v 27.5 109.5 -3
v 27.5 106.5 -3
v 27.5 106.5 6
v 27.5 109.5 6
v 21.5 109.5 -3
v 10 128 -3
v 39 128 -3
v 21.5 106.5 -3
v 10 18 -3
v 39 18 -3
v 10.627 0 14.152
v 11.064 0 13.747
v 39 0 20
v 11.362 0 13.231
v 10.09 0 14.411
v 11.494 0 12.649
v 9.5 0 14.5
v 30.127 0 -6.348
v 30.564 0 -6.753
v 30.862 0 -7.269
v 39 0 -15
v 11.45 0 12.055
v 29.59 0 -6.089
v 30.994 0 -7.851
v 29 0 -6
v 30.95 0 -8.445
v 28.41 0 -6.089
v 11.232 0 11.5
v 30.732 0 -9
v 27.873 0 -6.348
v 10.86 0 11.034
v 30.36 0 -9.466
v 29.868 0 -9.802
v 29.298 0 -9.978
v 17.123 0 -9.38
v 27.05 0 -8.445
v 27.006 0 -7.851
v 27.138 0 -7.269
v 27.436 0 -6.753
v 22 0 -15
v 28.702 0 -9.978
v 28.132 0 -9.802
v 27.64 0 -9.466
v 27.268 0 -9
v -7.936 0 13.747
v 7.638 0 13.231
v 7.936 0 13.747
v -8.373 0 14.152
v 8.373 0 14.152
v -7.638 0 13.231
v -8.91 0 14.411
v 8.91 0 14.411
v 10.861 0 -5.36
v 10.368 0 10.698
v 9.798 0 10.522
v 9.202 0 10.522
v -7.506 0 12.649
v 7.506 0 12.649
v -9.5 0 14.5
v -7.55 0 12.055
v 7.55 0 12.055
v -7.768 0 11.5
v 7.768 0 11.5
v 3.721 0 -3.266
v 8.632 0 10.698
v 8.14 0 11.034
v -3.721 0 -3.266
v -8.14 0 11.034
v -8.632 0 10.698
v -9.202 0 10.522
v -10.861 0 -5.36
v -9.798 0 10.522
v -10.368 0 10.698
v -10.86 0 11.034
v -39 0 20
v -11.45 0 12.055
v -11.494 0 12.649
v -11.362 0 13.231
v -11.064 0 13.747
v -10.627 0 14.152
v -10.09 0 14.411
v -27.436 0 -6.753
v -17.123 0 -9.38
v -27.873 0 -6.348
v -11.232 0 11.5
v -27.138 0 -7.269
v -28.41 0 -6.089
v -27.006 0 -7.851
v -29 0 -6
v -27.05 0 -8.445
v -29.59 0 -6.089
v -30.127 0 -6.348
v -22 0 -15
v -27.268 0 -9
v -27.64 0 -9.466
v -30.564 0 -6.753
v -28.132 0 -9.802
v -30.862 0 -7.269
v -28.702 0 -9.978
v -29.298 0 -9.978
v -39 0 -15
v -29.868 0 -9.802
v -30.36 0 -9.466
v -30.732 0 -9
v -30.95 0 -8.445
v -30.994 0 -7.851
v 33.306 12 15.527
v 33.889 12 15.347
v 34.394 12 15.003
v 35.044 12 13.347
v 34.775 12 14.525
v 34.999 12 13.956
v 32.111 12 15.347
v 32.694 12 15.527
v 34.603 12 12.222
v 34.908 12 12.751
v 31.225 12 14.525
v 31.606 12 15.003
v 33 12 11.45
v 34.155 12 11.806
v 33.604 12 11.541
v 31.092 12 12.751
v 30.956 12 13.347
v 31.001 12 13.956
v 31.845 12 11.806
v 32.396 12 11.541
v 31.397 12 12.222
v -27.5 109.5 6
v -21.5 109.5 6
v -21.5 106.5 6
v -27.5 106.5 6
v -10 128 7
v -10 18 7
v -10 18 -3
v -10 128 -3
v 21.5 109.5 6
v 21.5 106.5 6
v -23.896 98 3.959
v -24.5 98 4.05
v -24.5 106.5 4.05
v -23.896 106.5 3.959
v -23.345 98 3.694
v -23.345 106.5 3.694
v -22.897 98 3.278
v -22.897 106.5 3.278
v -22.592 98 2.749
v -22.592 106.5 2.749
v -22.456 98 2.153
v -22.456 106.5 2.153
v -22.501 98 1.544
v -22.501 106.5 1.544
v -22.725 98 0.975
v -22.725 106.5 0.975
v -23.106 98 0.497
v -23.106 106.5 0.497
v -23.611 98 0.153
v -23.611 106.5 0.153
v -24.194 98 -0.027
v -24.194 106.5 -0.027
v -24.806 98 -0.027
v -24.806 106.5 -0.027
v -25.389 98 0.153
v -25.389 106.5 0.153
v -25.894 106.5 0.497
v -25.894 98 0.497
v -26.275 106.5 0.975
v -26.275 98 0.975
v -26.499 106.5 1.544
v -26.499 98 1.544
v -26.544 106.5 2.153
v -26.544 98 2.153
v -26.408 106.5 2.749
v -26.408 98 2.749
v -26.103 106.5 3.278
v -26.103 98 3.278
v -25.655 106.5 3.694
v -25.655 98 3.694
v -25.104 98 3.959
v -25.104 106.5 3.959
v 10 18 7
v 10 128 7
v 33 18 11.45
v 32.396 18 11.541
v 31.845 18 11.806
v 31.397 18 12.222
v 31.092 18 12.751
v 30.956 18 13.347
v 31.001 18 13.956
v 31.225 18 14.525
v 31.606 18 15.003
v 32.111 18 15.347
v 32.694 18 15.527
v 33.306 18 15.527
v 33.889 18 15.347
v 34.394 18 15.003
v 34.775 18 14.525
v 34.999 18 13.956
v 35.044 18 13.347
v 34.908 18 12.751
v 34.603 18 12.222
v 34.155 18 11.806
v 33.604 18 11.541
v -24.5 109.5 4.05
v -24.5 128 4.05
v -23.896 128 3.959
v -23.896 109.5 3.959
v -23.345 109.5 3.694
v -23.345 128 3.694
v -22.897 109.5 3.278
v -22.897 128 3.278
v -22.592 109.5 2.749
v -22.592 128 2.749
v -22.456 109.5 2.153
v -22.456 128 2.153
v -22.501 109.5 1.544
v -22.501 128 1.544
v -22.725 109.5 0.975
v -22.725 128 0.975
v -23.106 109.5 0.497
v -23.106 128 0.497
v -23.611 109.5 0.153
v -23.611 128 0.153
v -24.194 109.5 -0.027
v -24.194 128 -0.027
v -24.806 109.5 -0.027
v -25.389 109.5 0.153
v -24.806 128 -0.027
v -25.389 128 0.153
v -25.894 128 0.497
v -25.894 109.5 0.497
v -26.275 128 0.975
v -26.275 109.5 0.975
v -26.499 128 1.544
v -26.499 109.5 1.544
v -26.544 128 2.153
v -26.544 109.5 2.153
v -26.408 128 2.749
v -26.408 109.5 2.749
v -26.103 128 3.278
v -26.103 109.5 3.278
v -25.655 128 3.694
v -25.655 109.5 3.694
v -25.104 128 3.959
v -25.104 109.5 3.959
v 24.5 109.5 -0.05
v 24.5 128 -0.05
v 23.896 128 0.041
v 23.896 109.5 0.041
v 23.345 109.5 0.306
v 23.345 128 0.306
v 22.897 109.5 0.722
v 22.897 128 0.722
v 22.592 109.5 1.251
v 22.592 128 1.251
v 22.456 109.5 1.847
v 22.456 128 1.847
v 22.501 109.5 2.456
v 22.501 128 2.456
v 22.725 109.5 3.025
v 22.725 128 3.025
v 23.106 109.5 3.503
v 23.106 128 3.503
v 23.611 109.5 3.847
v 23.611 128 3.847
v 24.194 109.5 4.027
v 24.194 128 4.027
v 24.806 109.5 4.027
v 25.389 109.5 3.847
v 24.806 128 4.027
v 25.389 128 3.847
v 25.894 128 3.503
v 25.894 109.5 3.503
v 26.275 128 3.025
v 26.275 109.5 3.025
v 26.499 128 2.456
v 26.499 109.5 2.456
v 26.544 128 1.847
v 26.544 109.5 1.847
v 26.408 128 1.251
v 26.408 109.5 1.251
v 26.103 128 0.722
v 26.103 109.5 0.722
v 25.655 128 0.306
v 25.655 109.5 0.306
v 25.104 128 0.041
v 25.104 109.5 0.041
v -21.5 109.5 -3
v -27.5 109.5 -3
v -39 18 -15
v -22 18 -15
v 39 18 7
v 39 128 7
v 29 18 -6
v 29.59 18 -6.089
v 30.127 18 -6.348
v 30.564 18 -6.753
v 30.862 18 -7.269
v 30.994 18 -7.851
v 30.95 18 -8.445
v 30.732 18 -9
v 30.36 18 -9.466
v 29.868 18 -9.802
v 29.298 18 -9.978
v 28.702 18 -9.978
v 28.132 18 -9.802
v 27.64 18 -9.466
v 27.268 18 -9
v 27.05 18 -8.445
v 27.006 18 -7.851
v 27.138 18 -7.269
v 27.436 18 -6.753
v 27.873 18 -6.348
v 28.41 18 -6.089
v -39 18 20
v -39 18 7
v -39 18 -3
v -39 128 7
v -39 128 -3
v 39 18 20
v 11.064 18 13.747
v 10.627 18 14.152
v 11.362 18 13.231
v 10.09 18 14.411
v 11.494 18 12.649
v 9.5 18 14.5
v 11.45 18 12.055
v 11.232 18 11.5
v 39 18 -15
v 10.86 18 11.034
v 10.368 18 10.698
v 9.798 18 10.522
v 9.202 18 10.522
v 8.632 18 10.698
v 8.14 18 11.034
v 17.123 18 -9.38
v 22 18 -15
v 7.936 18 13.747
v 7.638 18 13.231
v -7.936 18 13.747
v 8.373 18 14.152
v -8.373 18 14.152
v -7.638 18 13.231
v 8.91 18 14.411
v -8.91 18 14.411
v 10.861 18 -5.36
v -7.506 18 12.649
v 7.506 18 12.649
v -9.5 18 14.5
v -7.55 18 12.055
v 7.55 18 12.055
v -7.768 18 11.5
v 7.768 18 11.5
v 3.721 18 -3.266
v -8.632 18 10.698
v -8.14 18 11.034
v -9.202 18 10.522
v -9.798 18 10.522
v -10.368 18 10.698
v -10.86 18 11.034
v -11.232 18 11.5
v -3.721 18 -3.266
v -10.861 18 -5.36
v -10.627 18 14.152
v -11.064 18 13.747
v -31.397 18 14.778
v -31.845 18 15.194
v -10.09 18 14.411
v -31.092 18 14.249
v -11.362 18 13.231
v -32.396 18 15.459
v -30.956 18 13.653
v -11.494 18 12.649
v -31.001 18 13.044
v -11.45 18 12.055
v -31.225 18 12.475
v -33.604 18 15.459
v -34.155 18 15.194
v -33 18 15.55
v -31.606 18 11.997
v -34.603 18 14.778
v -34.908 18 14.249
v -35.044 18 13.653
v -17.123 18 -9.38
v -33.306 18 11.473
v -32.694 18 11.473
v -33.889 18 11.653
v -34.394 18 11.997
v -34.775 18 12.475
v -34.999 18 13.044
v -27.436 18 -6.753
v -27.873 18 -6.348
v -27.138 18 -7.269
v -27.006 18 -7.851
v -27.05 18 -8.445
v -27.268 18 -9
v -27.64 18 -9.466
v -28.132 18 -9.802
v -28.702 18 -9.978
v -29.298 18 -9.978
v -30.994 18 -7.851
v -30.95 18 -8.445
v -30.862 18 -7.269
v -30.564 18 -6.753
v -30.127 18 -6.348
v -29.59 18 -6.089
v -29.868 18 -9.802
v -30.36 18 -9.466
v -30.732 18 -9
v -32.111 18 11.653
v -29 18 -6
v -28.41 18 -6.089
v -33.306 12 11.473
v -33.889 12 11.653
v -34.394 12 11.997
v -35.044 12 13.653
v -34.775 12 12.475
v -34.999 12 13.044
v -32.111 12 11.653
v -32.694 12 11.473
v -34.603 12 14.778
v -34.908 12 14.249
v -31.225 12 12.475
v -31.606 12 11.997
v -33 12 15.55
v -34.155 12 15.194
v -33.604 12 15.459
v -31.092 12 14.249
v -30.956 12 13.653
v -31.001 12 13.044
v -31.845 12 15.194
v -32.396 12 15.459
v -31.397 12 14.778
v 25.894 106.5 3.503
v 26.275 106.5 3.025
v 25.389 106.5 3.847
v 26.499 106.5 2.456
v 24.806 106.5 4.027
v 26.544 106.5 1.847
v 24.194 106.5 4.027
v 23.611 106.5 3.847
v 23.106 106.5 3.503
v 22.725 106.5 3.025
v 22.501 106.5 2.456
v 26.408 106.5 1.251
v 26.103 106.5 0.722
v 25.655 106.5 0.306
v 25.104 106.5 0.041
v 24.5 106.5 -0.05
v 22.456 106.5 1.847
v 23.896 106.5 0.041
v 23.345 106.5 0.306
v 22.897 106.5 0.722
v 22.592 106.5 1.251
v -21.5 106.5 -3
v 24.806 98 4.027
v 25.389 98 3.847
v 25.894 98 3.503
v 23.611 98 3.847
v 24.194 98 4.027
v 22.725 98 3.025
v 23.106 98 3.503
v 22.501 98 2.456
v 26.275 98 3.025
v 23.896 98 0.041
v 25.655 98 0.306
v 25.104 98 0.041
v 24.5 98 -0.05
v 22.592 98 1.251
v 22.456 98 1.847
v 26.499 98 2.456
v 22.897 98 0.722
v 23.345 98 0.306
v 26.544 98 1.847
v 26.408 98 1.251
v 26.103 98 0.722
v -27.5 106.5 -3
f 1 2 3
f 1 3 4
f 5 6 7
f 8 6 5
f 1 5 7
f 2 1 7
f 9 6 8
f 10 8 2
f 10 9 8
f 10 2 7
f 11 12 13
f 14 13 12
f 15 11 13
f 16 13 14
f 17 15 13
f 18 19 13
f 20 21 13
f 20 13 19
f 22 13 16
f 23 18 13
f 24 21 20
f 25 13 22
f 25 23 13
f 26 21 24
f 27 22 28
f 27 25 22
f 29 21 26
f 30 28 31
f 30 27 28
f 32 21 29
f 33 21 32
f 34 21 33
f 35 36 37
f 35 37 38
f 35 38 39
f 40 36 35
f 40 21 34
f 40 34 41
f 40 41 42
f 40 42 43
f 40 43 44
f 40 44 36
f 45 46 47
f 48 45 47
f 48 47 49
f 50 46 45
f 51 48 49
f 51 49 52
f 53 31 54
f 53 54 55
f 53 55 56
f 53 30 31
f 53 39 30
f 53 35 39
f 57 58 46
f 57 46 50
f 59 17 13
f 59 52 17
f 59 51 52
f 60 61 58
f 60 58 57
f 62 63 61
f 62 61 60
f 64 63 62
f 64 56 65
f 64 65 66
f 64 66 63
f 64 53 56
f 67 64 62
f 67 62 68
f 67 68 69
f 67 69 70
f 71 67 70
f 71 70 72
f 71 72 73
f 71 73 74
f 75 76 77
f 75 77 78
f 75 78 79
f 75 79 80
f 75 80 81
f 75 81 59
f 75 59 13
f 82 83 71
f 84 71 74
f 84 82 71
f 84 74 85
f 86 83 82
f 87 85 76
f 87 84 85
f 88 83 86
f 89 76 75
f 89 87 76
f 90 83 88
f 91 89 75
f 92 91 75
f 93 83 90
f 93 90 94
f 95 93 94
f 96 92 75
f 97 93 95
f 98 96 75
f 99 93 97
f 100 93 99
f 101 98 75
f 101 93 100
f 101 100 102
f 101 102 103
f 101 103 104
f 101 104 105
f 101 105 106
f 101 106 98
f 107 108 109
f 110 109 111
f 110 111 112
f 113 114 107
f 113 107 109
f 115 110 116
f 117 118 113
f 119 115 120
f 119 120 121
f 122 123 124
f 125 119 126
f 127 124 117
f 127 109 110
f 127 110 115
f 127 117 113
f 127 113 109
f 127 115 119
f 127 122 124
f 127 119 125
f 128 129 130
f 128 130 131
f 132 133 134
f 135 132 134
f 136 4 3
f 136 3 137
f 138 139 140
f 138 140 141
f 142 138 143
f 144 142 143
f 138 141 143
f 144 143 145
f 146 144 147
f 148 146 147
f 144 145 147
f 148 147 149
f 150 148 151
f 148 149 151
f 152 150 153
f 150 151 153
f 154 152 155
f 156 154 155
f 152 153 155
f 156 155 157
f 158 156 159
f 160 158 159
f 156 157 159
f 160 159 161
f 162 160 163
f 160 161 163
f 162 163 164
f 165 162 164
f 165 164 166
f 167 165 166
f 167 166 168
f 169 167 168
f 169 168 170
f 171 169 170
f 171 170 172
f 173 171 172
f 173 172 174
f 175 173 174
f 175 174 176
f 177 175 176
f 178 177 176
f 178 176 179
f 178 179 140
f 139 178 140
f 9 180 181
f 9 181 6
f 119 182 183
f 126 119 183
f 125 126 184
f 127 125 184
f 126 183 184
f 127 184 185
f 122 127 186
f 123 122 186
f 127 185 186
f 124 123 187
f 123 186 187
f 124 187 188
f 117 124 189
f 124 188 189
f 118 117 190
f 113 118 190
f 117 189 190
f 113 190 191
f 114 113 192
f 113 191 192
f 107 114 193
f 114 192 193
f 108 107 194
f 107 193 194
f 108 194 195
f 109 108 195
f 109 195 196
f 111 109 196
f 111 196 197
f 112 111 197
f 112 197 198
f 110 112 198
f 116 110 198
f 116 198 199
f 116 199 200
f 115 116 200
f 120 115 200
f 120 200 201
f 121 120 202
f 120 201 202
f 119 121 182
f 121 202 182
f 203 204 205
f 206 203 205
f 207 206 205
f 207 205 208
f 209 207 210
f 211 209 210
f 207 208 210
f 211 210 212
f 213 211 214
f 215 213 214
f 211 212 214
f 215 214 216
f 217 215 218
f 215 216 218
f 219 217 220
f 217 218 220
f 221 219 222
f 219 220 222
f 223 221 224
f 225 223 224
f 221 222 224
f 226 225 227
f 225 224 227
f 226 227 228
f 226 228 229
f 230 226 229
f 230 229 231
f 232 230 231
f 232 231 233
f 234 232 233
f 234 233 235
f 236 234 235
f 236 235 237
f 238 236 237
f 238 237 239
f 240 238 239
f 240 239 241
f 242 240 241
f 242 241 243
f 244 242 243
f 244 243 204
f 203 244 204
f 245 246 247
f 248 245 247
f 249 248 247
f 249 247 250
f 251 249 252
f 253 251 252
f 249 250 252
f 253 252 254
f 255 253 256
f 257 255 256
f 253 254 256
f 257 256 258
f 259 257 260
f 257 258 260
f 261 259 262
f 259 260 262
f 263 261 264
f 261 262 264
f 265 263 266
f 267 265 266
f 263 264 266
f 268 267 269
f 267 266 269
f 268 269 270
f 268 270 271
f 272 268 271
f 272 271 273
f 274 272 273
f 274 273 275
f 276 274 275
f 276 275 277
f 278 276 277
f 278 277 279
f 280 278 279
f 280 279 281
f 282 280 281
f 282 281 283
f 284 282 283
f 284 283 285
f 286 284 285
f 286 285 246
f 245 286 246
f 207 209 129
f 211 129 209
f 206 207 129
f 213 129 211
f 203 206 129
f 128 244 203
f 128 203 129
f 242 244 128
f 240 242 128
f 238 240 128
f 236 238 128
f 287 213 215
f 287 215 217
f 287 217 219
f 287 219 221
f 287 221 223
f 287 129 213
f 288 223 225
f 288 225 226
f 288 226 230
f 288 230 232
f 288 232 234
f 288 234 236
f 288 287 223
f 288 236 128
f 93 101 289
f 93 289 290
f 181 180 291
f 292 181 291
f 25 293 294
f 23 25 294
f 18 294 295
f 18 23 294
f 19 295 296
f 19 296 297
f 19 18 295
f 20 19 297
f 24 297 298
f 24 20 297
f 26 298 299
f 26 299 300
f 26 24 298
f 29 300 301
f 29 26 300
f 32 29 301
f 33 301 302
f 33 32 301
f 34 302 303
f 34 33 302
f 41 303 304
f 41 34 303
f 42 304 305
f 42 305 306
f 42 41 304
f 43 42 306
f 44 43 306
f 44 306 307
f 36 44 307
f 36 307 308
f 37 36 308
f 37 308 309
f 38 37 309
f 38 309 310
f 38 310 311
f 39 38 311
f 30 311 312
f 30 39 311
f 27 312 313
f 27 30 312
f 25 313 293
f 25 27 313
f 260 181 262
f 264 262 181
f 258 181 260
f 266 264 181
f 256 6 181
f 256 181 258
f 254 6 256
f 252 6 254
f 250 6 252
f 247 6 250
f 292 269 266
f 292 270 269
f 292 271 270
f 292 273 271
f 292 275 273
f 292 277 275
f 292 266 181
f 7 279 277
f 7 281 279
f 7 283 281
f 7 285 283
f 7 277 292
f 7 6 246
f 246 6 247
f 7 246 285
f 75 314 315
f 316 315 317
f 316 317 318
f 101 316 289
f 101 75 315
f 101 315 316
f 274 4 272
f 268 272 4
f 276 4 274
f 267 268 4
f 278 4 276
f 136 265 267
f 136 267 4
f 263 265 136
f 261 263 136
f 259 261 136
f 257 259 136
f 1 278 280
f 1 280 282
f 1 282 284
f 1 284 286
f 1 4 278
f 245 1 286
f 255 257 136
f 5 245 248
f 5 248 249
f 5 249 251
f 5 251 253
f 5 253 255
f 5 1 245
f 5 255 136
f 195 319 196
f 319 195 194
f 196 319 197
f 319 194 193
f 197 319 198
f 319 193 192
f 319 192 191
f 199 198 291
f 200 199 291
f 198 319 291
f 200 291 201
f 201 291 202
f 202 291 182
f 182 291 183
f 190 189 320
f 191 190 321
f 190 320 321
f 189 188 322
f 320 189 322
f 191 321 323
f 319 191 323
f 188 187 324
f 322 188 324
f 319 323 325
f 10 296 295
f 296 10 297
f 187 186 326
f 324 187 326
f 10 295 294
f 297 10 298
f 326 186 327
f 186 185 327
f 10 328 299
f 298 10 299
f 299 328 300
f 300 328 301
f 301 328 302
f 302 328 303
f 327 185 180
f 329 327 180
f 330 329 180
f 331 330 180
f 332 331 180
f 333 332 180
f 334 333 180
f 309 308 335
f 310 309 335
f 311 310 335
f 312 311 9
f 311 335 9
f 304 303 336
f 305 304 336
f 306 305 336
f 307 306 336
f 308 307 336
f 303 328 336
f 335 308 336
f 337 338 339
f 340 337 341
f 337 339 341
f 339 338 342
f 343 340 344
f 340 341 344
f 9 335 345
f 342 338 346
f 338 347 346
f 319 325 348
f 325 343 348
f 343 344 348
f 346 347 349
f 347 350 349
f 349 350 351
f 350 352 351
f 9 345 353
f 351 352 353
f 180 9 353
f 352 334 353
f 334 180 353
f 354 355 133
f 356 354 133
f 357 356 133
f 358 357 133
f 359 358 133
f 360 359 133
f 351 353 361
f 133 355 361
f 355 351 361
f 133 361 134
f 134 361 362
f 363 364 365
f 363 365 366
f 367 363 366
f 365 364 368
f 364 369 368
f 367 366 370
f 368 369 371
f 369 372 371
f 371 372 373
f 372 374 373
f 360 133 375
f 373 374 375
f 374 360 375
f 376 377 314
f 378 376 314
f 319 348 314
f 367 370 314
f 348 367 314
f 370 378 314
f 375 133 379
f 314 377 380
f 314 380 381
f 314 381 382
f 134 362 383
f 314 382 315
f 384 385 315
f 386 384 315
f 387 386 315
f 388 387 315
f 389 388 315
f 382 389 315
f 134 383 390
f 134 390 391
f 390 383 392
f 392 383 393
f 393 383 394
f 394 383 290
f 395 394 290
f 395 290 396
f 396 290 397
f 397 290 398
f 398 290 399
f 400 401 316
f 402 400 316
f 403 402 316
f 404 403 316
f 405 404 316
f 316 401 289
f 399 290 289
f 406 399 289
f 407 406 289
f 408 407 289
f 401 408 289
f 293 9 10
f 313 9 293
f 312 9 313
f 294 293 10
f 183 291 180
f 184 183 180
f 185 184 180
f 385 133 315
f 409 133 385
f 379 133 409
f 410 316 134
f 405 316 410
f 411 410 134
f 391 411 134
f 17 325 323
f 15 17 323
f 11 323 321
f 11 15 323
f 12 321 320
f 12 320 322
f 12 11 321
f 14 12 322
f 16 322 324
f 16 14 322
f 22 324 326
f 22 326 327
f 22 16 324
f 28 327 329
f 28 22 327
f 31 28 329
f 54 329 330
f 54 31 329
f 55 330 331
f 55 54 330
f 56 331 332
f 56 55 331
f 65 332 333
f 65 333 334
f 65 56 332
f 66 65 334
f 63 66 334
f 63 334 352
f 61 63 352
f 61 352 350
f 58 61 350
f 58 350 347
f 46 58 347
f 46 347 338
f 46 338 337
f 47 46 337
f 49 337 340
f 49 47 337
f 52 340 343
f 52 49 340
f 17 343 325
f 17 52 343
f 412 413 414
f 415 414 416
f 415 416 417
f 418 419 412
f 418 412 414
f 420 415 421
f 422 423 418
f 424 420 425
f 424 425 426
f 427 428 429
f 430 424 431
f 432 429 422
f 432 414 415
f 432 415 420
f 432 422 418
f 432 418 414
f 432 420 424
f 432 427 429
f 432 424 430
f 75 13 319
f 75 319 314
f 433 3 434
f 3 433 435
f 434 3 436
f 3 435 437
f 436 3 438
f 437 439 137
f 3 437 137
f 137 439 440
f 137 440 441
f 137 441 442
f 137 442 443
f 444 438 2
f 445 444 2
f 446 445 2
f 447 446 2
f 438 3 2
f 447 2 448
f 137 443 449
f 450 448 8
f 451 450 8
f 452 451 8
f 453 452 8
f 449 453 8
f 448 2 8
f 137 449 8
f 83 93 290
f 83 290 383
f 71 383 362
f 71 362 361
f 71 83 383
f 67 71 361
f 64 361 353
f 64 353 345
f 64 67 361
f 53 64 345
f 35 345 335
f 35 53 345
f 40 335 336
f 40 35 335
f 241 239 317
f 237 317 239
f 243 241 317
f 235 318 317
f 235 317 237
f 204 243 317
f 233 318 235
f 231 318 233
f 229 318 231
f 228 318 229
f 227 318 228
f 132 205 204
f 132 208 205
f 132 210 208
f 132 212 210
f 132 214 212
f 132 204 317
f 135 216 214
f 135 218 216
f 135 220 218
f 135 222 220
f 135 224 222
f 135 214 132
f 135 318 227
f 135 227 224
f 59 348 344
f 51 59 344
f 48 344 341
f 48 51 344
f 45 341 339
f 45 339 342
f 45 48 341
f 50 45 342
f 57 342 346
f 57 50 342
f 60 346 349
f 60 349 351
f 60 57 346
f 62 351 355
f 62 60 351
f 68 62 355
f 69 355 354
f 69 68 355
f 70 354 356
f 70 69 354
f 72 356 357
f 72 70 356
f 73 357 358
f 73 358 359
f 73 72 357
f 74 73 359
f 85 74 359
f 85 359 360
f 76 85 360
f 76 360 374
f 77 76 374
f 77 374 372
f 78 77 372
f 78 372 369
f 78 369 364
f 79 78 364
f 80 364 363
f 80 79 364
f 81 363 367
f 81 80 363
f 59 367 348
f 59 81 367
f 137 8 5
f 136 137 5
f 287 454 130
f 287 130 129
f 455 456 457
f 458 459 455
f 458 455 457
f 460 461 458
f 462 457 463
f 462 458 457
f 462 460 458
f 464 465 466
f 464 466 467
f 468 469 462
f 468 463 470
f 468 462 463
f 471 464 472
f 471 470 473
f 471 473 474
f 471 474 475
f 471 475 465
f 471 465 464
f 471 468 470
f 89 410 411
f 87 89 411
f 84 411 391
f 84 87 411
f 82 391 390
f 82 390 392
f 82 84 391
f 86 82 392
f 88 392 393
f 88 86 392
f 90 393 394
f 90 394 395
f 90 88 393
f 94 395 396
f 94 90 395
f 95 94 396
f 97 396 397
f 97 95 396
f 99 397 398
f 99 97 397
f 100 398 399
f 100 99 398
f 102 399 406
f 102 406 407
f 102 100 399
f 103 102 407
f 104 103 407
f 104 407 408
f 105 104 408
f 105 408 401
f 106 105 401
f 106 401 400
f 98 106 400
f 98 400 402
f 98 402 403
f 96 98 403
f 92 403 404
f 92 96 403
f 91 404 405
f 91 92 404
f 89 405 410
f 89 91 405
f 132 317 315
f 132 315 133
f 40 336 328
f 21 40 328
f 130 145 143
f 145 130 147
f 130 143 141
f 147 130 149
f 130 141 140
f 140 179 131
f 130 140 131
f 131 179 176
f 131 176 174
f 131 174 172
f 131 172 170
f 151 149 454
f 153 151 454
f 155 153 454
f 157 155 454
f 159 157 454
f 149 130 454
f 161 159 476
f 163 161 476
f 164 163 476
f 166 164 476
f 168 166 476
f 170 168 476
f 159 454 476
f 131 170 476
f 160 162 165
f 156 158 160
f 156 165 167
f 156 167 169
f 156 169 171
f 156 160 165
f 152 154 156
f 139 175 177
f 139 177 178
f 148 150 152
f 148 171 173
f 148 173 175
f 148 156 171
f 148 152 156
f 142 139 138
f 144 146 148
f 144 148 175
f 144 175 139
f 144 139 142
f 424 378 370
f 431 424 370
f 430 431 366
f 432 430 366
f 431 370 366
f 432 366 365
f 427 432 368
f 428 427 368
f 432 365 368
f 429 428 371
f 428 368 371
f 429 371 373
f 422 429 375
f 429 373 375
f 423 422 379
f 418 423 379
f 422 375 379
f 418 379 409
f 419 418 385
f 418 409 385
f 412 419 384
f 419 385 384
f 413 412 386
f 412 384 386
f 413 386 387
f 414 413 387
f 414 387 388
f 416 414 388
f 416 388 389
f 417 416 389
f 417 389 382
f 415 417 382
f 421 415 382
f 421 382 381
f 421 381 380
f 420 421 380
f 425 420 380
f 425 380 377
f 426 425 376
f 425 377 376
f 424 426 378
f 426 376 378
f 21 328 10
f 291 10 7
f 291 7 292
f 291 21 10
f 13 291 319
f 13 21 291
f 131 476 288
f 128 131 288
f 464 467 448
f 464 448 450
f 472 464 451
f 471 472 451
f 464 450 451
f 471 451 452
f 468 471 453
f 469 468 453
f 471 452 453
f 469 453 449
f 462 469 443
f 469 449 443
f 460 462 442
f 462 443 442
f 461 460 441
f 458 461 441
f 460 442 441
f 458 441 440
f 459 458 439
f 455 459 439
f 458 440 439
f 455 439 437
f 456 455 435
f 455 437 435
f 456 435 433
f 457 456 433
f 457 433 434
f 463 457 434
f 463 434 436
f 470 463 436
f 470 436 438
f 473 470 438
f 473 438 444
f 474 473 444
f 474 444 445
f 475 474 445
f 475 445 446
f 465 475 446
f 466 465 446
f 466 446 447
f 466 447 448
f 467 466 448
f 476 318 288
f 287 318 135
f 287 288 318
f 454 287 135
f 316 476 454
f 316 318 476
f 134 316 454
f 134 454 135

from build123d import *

# Parameters (mm, degrees)
IZIM1_R                     = 2
Y_KSEKLIK_EKSTR_ZYON1_DEPTH = 18
IZIM2_W                     = 29
IZIM2_H                     = 10
Y_KSEKLIK_EKSTR_ZYON2_DEPTH = 110
IZIM3_R                     = 2.05
KES_EKSTR_ZYON1_DEPTH       = 6
IZIM4_R                     = 2.05
KES_EKSTR_ZYON2_DEPTH       = 30
IZIM5_W                     = 6
IZIM5_H                     = 3
KES_EKSTR_ZYON3_DEPTH       = 9


with BuildPart() as part:
    # Çizim1 → Yükseklik-Ekstrüzyon1 (new body)
    with BuildSketch(Plane(origin=(0, 0, 0), x_dir=(1, 0, 0), z_dir=(0, 1, 0))):
        with BuildLine():
            Line((-39, 15), (-22, 15))
            ThreePointArc((-22, 15), (0, 3), (22, 15))
            Line((22, 15), (39, 15))
            Line((39, 15), (39, -20))
            Line((39, -20), (-39, -20))
            Line((-39, -20), (-39, 15))
        make_face()
        with Locations(Location((-29, 8, 0), (0, 0, 270))):
            Circle(IZIM1_R, mode=Mode.SUBTRACT)
        with Locations(Location((29, 8, 0), (0, 0, 270))):
            Circle(IZIM1_R, mode=Mode.SUBTRACT)
        with Locations(Location((-9.5, -12.5, 0), (0, 0, 270))):
            Circle(IZIM1_R, mode=Mode.SUBTRACT)
        with Locations(Location((9.5, -12.5, 0), (0, 0, 270))):
            Circle(IZIM1_R, mode=Mode.SUBTRACT)
    extrude(amount=Y_KSEKLIK_EKSTR_ZYON1_DEPTH)

    # Çizim2 → Yükseklik-Ekstrüzyon2 (add)
    with BuildSketch(Plane(origin=(0, 18, 0), x_dir=(1, 0, 0), z_dir=(0, 1, 0))):
        with Locations((-24.5, -2)):
            Rectangle(IZIM2_W, IZIM2_H)
        with Locations((24.5, -2)):
            Rectangle(IZIM2_W, IZIM2_H)
    extrude(amount=Y_KSEKLIK_EKSTR_ZYON2_DEPTH)

    # Çizim3 → Kes-Ekstrüzyon1 (cut)
    with BuildSketch(Plane(origin=(0, 18, 0), x_dir=(1, 0, 0), z_dir=(0, 1, 0))):
        with Locations(Location((-33, -13.5, 0), (0, 0, 270))):
            Circle(IZIM3_R)
        with Locations(Location((33, -13.5, 0), (0, 0, 90))):
            Circle(IZIM3_R)
    extrude(amount=-KES_EKSTR_ZYON1_DEPTH, mode=Mode.SUBTRACT)

    # Çizim4 → Kes-Ekstrüzyon2 (cut)
    with BuildSketch(Plane(origin=(0, 128, 0), x_dir=(1, 0, 0), z_dir=(0, 1, 0))):
        with Locations(Location((-24.5, -2, 0), (0, 0, 270))):
            Circle(IZIM4_R)
        with Locations(Location((24.5, -2, 0), (0, 0, 90))):
            Circle(IZIM4_R)
    extrude(amount=-KES_EKSTR_ZYON2_DEPTH, mode=Mode.SUBTRACT)

    # Çizim5 → Kes-Ekstrüzyon3 (cut)
    with BuildSketch(Plane(origin=(0, 0, -3), x_dir=(-1, 0, 0), z_dir=(0, 0, -1))):
        with Locations((24.5, 108)):
            Rectangle(IZIM5_W, IZIM5_H)
        with Locations((-24.5, 108)):
            Rectangle(IZIM5_W, IZIM5_H)
    extrude(amount=-KES_EKSTR_ZYON3_DEPTH, mode=Mode.SUBTRACT)


solid = part.part
